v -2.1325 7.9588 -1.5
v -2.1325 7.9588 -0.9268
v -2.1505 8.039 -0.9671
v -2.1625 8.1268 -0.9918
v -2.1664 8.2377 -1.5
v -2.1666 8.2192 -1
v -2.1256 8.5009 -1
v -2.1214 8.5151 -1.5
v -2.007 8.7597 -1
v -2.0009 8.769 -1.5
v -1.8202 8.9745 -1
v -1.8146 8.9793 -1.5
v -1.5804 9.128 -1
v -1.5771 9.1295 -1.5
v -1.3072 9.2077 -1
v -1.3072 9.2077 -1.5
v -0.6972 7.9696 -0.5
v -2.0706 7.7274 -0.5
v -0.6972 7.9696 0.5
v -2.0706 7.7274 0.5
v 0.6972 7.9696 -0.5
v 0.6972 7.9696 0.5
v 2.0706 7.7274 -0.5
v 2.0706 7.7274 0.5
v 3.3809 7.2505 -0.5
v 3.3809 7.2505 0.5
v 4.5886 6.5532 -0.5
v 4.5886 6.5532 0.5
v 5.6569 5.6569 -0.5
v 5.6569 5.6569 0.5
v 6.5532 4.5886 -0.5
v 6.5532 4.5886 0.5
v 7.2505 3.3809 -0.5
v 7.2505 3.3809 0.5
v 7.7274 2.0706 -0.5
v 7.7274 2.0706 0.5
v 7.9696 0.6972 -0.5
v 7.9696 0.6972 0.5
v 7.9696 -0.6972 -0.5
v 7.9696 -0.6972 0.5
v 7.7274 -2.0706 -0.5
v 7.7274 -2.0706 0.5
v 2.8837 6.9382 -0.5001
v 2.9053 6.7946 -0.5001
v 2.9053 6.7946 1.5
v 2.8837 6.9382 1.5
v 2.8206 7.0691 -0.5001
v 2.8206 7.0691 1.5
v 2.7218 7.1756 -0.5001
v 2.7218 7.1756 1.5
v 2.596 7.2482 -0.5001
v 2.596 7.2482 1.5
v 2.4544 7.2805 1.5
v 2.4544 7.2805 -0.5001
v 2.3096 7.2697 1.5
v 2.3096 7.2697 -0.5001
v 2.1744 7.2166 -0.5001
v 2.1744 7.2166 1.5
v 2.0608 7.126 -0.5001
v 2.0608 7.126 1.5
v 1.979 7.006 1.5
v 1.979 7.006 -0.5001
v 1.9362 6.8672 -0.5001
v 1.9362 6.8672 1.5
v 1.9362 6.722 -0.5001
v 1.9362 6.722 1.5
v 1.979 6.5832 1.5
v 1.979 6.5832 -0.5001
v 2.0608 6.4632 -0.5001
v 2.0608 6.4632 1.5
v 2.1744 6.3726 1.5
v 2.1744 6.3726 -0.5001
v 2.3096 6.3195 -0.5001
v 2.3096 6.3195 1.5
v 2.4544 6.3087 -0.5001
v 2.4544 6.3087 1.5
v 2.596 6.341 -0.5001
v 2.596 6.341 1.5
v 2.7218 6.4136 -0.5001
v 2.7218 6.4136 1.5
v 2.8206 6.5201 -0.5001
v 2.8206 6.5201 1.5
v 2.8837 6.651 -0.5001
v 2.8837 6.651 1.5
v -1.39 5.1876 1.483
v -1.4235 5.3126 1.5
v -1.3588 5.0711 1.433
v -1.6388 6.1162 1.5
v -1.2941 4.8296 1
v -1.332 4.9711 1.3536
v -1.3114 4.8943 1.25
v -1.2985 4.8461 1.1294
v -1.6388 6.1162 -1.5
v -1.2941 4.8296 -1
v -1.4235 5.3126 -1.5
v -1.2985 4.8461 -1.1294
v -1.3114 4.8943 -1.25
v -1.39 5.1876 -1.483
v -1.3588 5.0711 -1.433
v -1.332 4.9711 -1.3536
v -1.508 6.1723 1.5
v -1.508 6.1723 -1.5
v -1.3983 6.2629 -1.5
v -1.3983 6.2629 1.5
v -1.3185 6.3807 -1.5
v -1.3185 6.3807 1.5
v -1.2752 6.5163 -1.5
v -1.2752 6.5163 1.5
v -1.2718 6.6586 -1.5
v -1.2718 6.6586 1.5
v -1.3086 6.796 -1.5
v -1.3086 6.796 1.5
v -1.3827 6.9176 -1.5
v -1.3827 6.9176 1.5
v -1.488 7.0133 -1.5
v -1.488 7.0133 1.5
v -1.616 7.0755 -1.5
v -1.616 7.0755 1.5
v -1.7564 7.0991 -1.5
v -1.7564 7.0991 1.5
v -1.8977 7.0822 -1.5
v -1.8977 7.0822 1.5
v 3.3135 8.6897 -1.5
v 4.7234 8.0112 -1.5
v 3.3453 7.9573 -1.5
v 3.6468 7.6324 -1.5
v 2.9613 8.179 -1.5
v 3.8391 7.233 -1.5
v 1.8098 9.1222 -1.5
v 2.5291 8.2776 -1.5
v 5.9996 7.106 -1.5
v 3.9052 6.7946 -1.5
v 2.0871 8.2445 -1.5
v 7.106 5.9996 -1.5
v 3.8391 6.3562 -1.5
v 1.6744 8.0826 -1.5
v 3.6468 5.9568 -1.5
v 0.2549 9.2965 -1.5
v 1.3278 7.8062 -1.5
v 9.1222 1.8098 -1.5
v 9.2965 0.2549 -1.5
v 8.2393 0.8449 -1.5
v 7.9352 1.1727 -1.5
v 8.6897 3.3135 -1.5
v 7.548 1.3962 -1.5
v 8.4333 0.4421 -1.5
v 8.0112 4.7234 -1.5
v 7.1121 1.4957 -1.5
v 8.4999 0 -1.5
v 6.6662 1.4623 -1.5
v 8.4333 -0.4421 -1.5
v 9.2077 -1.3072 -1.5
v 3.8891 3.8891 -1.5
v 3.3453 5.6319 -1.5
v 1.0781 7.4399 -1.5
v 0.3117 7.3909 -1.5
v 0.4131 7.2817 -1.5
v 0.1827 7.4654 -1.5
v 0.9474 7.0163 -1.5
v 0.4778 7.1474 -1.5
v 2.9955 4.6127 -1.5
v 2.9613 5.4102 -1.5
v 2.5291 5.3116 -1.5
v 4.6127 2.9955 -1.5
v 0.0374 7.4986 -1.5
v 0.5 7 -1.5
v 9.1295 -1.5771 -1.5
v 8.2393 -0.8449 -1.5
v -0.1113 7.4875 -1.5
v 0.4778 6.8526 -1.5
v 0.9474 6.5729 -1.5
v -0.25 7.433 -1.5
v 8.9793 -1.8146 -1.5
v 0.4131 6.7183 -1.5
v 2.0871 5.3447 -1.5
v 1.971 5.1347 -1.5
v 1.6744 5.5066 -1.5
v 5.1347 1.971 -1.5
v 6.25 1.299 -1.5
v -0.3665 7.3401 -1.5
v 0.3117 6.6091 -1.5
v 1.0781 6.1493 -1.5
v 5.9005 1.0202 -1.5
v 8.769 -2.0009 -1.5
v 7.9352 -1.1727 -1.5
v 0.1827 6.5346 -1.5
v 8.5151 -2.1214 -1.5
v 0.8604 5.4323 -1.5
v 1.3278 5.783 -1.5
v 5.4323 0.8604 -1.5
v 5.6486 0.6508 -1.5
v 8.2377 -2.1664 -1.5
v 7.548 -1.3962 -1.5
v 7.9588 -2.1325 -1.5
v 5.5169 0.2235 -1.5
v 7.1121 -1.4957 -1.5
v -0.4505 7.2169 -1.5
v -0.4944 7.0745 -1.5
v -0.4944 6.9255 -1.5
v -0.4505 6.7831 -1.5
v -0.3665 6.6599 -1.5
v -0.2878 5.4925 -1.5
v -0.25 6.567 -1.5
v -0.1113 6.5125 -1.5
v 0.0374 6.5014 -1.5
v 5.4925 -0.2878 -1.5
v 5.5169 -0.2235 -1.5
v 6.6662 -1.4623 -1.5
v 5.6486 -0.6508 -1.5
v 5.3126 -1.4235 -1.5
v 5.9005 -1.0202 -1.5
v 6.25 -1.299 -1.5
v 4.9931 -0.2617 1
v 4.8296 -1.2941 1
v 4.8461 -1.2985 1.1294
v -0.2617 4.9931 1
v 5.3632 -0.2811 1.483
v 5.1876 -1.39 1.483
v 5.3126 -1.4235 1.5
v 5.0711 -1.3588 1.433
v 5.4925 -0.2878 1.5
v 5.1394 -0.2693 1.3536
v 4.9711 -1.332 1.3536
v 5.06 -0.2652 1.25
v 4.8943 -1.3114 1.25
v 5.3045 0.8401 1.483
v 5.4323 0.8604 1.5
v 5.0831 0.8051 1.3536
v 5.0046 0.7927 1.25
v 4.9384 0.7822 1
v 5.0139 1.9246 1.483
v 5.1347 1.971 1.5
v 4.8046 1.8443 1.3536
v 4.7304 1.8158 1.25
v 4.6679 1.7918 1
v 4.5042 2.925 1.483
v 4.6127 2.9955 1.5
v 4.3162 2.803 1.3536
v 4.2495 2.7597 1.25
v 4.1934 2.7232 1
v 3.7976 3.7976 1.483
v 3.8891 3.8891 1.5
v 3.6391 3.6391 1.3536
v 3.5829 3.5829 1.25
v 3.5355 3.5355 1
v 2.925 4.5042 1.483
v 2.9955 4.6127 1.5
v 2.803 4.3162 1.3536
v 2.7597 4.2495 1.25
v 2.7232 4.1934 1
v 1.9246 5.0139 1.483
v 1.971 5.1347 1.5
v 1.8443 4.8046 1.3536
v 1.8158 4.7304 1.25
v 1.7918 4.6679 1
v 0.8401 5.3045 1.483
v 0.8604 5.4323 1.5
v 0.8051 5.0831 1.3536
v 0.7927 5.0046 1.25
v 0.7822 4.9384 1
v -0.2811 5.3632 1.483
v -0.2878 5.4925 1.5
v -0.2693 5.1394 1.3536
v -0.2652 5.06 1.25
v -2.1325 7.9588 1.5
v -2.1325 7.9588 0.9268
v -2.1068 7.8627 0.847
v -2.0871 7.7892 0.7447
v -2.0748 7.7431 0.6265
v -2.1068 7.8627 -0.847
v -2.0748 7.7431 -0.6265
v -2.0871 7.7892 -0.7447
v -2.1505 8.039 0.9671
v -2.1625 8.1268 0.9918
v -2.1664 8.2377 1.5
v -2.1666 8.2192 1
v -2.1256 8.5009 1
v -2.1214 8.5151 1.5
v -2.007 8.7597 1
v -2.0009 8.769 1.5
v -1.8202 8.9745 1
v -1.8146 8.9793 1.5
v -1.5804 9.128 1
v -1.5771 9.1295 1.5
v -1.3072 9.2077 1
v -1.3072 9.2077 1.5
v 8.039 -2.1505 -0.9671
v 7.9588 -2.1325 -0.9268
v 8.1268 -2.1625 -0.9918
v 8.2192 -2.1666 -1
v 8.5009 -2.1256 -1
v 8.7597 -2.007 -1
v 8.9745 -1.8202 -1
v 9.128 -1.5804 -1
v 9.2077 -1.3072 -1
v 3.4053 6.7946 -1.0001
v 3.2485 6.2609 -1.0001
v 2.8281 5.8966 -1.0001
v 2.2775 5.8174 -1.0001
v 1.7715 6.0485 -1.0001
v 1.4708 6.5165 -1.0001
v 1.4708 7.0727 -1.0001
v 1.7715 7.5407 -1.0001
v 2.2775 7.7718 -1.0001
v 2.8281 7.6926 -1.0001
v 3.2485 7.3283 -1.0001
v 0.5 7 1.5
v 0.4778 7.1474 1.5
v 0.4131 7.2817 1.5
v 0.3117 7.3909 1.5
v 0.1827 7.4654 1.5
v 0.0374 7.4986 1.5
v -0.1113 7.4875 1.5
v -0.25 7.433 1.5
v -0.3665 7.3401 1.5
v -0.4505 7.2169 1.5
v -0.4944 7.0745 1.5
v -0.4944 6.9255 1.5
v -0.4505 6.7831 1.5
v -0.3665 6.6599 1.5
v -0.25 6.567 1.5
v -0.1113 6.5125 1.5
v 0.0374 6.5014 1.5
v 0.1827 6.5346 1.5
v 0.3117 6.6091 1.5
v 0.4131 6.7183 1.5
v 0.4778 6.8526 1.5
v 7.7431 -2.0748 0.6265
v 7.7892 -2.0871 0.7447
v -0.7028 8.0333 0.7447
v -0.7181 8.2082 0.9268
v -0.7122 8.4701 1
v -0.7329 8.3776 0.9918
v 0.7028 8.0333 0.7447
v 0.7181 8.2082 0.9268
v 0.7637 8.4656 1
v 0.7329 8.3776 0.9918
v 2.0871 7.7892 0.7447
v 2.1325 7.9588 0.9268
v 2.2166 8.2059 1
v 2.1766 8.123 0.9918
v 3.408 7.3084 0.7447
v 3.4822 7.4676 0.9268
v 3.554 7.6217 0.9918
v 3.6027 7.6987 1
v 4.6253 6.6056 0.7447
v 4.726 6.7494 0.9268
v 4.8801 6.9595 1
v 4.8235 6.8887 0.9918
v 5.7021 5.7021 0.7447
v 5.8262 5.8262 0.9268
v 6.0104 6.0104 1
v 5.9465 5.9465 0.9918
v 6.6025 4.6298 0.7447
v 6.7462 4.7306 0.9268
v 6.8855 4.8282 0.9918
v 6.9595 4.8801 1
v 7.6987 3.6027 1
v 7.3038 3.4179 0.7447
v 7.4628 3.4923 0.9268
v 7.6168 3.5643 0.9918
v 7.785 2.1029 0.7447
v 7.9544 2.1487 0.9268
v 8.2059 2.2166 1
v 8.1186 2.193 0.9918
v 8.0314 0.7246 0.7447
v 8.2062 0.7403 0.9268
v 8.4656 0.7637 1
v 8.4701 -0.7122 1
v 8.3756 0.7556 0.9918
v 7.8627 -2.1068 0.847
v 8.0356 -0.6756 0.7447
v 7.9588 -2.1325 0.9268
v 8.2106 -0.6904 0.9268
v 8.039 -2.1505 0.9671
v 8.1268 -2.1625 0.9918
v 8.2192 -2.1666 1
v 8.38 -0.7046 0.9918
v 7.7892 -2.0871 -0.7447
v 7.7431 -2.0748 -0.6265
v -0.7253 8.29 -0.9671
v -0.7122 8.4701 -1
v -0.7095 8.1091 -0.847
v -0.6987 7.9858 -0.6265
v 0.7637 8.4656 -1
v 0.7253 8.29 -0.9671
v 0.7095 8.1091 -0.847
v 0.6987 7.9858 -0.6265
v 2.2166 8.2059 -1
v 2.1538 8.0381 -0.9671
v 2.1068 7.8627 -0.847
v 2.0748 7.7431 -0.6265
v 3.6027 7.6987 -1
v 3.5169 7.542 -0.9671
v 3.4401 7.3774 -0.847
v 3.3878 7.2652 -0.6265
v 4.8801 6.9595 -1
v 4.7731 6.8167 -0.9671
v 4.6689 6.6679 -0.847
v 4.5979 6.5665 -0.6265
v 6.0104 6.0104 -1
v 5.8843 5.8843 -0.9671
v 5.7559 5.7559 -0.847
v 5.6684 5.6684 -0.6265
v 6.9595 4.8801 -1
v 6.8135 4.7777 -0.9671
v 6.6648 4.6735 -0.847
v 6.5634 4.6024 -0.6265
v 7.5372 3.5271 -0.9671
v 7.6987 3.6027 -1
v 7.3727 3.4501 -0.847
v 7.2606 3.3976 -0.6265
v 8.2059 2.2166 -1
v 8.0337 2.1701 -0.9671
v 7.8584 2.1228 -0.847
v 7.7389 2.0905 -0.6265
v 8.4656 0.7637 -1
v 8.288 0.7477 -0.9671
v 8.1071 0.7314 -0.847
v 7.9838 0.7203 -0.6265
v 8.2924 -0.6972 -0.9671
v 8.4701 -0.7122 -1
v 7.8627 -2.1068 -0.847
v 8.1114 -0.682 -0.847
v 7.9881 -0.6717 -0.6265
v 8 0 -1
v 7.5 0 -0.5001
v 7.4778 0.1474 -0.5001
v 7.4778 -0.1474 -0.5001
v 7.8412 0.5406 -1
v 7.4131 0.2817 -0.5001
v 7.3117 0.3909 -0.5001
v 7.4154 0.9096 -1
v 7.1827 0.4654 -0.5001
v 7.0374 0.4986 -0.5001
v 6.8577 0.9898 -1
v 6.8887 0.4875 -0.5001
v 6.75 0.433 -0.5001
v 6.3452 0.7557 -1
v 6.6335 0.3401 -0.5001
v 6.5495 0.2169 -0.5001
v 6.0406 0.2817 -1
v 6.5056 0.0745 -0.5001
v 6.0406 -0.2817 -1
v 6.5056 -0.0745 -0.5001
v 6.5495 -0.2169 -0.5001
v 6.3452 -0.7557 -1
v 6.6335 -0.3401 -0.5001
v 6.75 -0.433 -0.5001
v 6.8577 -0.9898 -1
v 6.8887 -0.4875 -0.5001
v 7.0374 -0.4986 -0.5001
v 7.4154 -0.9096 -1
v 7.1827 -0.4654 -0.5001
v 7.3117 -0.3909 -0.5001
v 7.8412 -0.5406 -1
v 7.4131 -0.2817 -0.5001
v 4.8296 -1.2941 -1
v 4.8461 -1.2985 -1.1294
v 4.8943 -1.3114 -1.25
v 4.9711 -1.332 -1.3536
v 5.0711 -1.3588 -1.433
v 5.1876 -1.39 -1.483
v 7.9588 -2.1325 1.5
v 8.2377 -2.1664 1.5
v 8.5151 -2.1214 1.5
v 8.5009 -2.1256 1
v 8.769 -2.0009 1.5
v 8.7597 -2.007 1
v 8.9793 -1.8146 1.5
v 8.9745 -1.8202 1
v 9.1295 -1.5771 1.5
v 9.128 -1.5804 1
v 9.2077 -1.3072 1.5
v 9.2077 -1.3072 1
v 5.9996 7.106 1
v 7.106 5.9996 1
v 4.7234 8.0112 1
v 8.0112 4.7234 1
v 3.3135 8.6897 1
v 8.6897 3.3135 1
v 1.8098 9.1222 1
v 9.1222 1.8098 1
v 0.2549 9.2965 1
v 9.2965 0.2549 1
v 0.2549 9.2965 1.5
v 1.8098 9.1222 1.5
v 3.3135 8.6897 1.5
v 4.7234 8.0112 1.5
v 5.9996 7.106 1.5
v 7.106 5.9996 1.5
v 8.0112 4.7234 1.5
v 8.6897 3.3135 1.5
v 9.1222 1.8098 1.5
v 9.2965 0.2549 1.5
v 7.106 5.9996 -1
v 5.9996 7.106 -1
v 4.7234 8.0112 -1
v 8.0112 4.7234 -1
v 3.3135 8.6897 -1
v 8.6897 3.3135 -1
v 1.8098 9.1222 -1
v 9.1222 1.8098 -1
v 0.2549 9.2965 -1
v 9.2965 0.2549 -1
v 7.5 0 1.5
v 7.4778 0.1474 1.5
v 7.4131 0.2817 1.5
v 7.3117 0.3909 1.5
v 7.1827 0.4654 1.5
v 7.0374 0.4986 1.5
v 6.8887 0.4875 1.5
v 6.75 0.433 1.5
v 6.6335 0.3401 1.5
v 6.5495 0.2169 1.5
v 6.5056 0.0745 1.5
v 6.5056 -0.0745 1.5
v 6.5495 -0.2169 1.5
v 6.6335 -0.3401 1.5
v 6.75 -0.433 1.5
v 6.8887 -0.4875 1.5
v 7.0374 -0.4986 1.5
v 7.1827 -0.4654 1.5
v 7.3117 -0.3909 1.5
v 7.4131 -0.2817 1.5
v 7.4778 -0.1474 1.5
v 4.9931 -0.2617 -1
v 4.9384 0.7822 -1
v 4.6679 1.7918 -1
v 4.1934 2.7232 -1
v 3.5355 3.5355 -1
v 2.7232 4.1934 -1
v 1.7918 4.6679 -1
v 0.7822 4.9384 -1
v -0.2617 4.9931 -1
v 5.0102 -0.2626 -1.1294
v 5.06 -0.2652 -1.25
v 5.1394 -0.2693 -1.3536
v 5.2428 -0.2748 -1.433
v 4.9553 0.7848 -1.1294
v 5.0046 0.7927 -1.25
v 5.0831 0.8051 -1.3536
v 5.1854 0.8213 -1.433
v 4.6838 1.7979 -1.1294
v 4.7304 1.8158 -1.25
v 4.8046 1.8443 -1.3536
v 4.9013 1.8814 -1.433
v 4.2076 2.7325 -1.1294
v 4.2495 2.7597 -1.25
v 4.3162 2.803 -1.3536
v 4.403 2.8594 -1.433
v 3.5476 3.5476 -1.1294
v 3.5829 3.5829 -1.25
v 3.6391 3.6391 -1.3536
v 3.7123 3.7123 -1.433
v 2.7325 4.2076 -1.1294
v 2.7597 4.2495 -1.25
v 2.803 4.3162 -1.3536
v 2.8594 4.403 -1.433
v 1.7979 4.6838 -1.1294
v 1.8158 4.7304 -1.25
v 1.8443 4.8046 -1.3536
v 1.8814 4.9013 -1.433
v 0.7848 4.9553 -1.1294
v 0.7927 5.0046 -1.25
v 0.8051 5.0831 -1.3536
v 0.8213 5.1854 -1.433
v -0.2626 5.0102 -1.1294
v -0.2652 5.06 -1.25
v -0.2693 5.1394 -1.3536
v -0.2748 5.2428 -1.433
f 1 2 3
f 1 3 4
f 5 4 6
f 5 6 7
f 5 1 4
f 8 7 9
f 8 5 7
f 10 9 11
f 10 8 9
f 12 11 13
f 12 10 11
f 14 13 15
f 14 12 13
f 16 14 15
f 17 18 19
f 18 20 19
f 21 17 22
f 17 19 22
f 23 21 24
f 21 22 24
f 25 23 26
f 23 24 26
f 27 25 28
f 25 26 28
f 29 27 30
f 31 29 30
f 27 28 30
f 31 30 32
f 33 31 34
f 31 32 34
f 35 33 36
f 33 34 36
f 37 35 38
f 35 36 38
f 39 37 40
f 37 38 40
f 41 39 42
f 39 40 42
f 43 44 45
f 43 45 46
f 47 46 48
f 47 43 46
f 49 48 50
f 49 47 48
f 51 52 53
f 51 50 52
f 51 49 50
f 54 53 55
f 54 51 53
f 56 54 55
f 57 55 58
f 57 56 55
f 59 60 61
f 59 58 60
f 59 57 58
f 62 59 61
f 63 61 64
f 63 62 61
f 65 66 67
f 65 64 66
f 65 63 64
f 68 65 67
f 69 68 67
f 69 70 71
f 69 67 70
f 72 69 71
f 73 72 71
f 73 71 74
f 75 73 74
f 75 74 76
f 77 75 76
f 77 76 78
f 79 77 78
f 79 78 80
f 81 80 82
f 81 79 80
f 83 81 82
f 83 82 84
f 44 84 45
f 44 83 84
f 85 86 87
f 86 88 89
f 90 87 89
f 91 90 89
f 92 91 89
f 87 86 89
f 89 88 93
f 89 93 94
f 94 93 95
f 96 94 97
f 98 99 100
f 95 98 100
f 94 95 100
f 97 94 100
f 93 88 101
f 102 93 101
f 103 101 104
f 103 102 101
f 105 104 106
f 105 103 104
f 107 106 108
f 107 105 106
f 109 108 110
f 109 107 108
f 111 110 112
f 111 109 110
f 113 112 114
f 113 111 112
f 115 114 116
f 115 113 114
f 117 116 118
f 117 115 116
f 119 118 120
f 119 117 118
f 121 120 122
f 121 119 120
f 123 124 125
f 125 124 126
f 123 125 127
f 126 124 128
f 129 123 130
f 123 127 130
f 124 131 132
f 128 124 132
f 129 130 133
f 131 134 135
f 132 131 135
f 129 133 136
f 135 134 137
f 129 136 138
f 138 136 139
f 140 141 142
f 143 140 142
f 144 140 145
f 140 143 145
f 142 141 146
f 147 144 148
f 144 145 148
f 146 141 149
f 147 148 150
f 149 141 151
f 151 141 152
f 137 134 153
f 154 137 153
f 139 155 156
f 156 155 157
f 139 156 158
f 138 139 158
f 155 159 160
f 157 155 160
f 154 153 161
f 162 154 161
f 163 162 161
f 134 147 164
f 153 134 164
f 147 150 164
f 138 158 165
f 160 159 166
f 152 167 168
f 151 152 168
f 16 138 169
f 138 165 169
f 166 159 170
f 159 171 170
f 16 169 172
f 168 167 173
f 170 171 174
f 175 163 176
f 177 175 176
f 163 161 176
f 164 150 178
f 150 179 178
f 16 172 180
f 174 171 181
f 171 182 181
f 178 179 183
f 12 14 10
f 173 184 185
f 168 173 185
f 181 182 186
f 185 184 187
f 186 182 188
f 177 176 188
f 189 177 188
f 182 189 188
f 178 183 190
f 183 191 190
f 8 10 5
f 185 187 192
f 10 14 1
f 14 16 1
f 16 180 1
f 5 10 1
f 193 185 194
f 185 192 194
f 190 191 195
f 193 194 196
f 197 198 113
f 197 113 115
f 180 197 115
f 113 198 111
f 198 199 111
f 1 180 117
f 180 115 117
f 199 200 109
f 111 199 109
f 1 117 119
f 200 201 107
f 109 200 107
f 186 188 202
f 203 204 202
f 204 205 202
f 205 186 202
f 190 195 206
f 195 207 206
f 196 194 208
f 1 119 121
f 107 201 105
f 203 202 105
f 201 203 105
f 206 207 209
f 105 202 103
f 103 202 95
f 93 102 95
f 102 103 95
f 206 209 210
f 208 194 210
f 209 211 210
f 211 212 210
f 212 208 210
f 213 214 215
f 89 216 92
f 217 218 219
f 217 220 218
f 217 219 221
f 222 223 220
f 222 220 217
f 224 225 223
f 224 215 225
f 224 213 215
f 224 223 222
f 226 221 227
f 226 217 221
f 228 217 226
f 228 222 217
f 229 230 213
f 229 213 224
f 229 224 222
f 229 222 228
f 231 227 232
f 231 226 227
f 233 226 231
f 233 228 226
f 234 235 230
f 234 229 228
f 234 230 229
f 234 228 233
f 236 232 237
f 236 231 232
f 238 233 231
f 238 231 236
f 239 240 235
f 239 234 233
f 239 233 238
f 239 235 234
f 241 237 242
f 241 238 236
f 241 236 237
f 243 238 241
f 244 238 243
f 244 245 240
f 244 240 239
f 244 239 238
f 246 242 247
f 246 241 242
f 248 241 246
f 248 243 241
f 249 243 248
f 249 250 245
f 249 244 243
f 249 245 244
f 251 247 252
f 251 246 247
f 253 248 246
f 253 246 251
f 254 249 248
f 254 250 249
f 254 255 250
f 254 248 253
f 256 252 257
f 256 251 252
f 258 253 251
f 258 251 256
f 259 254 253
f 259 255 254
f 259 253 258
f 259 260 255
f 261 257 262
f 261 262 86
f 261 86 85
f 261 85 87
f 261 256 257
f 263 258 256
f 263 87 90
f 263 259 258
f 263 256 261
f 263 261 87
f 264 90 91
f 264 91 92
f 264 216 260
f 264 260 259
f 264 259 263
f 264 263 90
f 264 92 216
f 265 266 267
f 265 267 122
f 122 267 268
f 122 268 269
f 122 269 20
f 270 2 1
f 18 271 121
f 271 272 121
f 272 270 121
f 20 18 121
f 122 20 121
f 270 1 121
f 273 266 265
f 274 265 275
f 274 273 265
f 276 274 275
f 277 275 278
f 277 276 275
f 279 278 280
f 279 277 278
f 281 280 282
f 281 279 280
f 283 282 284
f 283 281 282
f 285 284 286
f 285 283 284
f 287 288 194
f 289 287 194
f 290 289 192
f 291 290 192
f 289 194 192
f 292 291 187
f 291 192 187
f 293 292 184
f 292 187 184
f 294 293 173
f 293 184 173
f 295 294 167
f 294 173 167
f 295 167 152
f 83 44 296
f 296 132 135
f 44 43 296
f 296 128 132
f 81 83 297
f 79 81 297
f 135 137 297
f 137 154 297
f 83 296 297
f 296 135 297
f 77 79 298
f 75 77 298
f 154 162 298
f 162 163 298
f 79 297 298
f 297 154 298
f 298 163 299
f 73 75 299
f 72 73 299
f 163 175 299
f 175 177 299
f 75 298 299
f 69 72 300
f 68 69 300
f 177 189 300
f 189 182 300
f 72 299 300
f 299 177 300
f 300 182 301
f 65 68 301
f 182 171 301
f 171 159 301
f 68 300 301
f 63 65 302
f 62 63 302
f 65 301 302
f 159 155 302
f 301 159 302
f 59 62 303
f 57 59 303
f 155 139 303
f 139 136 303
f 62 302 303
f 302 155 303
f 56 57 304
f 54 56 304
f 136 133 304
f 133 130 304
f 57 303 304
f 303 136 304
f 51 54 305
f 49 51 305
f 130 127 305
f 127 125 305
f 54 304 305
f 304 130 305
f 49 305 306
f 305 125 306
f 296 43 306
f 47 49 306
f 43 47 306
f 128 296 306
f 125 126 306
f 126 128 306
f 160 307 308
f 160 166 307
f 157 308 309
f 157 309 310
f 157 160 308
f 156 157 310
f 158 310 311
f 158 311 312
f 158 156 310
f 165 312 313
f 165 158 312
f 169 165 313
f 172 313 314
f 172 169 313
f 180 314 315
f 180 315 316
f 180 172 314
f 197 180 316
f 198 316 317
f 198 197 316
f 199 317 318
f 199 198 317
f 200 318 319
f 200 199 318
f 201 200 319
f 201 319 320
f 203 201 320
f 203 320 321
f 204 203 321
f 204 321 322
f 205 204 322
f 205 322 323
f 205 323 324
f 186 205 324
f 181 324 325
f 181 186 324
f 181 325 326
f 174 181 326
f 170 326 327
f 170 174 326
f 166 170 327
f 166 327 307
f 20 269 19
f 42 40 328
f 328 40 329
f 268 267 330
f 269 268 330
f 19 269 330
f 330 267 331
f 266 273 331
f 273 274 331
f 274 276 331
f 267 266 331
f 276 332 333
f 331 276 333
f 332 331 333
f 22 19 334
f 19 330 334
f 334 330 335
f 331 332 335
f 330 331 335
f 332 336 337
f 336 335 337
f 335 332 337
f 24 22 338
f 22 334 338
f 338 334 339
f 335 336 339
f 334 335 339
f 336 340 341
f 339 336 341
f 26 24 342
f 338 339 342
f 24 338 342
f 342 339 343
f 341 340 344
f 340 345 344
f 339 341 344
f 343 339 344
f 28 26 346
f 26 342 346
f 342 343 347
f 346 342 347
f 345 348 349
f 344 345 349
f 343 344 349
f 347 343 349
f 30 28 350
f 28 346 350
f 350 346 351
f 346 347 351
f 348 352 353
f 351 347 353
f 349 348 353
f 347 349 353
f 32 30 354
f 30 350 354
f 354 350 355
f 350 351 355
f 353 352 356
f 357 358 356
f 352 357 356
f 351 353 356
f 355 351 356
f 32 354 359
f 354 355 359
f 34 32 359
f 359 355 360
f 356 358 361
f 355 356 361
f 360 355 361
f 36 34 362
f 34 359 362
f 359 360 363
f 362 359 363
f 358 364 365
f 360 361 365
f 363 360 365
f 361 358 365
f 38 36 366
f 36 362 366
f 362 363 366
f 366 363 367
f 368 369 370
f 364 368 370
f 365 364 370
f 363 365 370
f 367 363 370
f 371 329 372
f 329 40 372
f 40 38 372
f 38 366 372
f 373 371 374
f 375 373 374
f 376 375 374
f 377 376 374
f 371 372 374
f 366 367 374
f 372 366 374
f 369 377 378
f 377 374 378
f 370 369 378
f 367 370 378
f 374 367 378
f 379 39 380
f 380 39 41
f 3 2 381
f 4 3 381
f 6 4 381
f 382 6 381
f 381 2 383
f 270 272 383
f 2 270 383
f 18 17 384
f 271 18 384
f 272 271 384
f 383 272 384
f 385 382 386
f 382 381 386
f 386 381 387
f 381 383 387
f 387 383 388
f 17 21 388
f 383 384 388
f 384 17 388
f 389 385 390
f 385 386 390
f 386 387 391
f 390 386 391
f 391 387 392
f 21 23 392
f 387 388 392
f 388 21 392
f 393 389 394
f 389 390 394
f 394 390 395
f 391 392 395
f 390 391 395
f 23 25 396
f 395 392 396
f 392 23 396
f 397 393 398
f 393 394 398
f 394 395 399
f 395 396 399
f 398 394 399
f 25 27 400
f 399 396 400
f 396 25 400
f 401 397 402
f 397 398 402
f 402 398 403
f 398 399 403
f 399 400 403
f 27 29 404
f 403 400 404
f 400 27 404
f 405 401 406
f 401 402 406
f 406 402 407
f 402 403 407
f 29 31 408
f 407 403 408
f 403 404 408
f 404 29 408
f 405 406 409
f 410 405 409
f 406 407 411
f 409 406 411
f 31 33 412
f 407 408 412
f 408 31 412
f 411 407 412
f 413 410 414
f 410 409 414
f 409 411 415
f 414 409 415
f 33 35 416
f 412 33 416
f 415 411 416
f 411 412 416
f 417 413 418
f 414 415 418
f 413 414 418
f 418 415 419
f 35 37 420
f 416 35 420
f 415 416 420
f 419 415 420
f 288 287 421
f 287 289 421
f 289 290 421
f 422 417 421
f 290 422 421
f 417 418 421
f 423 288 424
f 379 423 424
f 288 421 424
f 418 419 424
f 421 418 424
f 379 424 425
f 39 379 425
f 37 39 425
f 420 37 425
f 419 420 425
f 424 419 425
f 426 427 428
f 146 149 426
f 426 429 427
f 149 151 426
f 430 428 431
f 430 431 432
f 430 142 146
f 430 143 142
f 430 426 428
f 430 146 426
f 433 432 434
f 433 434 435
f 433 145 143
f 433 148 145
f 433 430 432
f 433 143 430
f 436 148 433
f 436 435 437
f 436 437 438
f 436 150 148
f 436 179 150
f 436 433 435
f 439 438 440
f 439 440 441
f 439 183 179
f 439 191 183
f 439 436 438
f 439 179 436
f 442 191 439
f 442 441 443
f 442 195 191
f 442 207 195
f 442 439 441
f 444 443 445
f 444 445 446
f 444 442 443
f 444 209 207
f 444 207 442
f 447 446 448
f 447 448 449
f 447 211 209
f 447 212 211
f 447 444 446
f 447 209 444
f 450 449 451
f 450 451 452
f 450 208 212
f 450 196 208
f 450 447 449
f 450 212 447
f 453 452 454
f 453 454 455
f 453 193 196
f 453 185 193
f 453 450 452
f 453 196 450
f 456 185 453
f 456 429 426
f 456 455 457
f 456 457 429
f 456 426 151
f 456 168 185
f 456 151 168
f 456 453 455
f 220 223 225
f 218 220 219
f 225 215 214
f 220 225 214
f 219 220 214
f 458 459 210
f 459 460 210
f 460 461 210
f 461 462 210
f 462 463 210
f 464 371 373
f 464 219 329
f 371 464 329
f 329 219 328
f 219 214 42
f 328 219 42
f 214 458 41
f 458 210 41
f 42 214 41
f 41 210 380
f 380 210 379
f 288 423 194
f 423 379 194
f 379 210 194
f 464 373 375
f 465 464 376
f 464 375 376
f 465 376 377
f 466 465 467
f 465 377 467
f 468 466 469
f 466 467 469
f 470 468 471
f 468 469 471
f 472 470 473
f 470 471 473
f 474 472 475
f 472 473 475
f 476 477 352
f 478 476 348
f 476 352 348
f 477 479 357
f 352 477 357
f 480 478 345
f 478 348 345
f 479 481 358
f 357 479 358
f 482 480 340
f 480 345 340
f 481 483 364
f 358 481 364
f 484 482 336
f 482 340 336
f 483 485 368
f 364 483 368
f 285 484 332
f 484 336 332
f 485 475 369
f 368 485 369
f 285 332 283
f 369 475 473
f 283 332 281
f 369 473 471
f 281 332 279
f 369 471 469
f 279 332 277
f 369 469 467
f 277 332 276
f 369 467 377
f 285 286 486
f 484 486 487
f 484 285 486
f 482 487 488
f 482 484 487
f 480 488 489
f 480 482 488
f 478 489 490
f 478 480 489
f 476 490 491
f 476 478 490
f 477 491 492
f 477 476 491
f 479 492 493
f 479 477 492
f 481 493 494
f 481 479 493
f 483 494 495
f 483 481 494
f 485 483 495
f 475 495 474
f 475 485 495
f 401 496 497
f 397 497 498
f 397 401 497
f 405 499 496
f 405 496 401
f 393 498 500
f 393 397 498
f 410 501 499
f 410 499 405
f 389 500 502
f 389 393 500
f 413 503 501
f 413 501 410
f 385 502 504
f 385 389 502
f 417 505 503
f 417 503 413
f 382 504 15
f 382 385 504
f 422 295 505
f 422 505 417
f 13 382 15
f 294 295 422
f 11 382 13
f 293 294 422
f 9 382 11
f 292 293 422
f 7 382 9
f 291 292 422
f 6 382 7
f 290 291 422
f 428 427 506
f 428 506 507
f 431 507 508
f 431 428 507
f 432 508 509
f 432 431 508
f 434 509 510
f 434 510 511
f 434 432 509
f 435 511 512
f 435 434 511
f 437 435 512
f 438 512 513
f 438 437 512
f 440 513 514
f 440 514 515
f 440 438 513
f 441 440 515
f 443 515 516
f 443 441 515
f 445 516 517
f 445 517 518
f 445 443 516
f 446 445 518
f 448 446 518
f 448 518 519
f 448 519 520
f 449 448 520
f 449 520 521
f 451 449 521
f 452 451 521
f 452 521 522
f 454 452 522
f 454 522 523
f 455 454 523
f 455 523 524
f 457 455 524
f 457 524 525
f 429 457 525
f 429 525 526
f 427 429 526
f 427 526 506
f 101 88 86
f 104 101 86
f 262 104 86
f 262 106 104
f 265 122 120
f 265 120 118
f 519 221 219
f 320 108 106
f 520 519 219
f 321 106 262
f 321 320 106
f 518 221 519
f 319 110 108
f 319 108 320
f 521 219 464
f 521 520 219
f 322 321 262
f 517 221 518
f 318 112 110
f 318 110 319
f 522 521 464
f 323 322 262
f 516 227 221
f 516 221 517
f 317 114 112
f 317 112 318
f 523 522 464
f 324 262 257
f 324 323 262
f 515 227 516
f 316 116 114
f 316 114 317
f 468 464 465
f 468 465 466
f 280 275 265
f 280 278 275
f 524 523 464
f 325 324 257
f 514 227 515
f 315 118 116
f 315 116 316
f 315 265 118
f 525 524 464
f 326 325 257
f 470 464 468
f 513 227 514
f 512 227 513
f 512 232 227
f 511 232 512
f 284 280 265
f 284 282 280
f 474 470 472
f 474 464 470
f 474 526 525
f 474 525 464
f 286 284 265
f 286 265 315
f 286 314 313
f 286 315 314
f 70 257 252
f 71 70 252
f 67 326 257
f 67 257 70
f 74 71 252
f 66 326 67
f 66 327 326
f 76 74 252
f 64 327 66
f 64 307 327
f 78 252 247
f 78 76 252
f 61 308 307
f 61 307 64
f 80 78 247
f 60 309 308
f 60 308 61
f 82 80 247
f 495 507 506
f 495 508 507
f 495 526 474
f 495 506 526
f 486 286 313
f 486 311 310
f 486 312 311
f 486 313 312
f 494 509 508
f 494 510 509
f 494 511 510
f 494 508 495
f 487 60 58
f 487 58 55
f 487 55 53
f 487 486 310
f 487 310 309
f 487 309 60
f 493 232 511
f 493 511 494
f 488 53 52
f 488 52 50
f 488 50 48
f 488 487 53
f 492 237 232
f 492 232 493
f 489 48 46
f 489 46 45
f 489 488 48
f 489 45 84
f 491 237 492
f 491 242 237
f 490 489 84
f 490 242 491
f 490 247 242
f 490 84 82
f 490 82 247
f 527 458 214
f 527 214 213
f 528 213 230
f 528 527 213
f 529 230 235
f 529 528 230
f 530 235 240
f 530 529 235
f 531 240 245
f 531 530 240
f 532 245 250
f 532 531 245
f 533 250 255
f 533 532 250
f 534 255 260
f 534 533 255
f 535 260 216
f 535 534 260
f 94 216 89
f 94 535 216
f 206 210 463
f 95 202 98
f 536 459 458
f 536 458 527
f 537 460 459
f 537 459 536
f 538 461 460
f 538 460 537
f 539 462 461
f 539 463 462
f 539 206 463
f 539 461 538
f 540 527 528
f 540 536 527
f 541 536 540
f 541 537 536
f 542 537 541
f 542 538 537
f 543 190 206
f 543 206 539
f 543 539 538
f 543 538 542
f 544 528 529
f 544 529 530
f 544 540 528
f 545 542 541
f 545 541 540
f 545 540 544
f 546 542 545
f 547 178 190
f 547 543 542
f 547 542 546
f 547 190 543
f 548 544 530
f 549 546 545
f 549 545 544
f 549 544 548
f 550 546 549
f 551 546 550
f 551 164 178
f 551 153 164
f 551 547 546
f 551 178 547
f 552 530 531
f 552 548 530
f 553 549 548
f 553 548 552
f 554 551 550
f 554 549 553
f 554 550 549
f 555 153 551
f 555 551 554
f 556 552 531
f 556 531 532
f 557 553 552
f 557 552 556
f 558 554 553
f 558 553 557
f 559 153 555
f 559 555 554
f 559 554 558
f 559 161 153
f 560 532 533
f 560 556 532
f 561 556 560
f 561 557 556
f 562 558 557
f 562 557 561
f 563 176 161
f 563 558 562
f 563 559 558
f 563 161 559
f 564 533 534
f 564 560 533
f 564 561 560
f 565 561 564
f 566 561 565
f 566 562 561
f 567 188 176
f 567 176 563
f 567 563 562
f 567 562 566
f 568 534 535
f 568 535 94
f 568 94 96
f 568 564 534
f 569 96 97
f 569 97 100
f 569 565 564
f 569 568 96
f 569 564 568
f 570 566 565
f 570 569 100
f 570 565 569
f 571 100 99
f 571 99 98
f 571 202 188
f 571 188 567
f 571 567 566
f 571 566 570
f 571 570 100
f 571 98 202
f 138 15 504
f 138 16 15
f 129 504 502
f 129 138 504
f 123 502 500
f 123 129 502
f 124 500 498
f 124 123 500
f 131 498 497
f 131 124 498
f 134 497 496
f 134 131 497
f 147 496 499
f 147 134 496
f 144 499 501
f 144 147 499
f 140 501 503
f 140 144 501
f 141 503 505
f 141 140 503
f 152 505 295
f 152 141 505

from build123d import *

# Parameters (mm, degrees)
SKETCH1_R               = 8.5
SKETCH1_R_2             = 0.5
SKETCH1_R_3             = 5
BOSS_EXTRUDE1_DEPTH     = 1.5
SKETCH7_W               = 0.8
SKETCH7_H               = 0.5
CUT_EXTRUDE1_DEPTH      = 14.237446884
CUT_EXTRUDE1_DEPTH_BACK = 14.237446884
CUT_EXTRUDE2_DEPTH      = 14.489996294
CUT_EXTRUDE2_DEPTH_BACK = 14.489996294
SKETCH5_R               = 0.5
SKETCH5_R_2             = 0.48729794
FILLET1_R               = 0.5
FILLET2_R               = 1
CHAMFER1_SIZE           = 1


with BuildPart() as part:
    # Sketch1 → Boss-Extrude1 (new, symmetric)
    with BuildSketch(Plane.XY):
        Circle(SKETCH1_R)
        with Locations((7, 0)):
            Circle(SKETCH1_R_2, mode=Mode.SUBTRACT)
        Circle(SKETCH1_R_3, mode=Mode.SUBTRACT)
        with Locations((0, -7)):
            Circle(SKETCH1_R_2, mode=Mode.SUBTRACT)
        with Locations((-7, 0)):
            Circle(SKETCH1_R_2, mode=Mode.SUBTRACT)
        with Locations((0, 7)):
            Circle(SKETCH1_R_2, mode=Mode.SUBTRACT)
    extrude(amount=BOSS_EXTRUDE1_DEPTH, both=True)

    # Sketch2 → Cut-Revolve1 (revolve, cut)
    with BuildSketch(Plane(origin=(0, 0, 0), x_dir=(1, 0, 0), z_dir=(0, 1, 0)), mode=Mode.PRIVATE) as cut_revolve1_sk:
        with BuildLine():
            Line((-8, 0.5), (-8, -0.5))
            ThreePointArc((-8, -0.5), (-8.146446609, -0.853553391), (-8.5, -1))
            Line((-8.5, -1), (-8.5, 1))
            ThreePointArc((-8.5, 1), (-8.146446609, 0.853553391), (-8, 0.5))
        make_face()
    revolve(cut_revolve1_sk.sketch.rotate(Axis((0, 0, 0), (0, 0, -1)), 180), axis=Axis((0, 0, 0), (0, 0, -1)), mode=Mode.SUBTRACT)

    # Sketch7 → Revolve1 (revolve)
    with BuildSketch(Plane(origin=(0, 0, 0), x_dir=(1, 0, 0), z_dir=(0, 1, 0))):
        with Locations((8.9, 1.25)):
            Rectangle(SKETCH7_W, SKETCH7_H)
        with Locations((8.9, -1.25)):
            Rectangle(SKETCH7_W, SKETCH7_H)
    revolve(axis=Axis((0, 0, 0), (0, 0, -1)))

    # Sketch4 → Cut-Extrude1 (cut, two sides: drawn at the far end of the back side and taken through both)
    with BuildSketch(Plane.XY.offset(-CUT_EXTRUDE1_DEPTH_BACK)):
        Polygon((-2.654263152, 9.905844942), (0, 0), (10.350145374, -2.773313095), (10.350145374, -11.033622271), (-11.334173843, -11.033622271), (-11.334173843, 9.905844942), align=None)
    extrude(amount=CUT_EXTRUDE1_DEPTH + CUT_EXTRUDE1_DEPTH_BACK, mode=Mode.SUBTRACT)

    # Sketch5 → Cut-Extrude2 (cut, two sides: drawn at the far end of the back side and taken through both)
    with BuildSketch(Plane.XY.offset(1.5).offset(-CUT_EXTRUDE2_DEPTH_BACK)):
        with Locations((-1.768253171, 6.599210675)):
            Circle(SKETCH5_R)
        with Locations((2.418011057, 6.794599377)):
            Circle(SKETCH5_R_2)
    extrude(amount=CUT_EXTRUDE2_DEPTH + CUT_EXTRUDE2_DEPTH_BACK, mode=Mode.SUBTRACT)

    # Fillet1
    fillet1_edges = [part.edges().sort_by_distance(p)[0] for p in [
        (3.535533906, 3.535533906, 1.5),
        (3.535533906, 3.535533906, -1.5),
    ]]
    fillet(fillet1_edges, radius=FILLET1_R)

    # Fillet2
    fillet2_edges = [part.edges().sort_by_distance(p)[0] for p in [
        (8.983110184, -2.407017119, -1.25),
        (8.983110184, -2.407017119, 1.25),
        (-2.407017119, 8.983110184, -1.25),
        (-2.407017119, 8.983110184, 1.25),
    ]]
    fillet(fillet2_edges, radius=FILLET2_R)

    # Chamfer1
    chamfer1_edges = [part.edges().sort_by_distance(p)[0] for p in [
        (6.5, 0, -1.5),
        (1.930713118, 6.794599377, -1.5),
    ]]
    chamfer(chamfer1_edges, length=CHAMFER1_SIZE - 0.0001)  # a hair under: the kernel refuses the full size


solid = part.part
